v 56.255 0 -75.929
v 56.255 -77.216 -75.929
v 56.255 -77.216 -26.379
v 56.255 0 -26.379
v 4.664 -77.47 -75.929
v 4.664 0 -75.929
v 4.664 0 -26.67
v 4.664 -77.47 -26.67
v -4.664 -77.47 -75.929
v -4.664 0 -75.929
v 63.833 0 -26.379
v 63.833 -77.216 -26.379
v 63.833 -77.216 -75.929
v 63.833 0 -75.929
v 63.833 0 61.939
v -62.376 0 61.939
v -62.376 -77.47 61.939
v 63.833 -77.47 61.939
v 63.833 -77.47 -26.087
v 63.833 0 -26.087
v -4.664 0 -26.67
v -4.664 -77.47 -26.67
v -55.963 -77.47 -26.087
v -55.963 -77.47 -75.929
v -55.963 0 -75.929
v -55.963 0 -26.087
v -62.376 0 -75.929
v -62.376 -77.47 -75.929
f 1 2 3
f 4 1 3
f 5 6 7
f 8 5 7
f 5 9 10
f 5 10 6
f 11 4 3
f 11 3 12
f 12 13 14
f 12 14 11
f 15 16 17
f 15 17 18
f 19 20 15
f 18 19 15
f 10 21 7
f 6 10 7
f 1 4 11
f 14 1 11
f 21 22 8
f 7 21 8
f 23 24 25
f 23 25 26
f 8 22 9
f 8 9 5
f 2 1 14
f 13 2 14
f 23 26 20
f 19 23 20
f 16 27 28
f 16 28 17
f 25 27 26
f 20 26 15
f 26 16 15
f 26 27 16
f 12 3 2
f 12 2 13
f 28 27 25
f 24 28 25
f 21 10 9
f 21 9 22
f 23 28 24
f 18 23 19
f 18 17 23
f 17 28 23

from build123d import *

# Parameters (mm, degrees)
F0_W     = 126.2088567019
F0_H     = 88.0255773664
F1_DEPTH = 77.47
F2_W     = 6.4124614
F2_H     = 49.8422943056
F4_DEPTH = 77.47
F2_W_2   = 9.3272165395
F2_H_2   = 49.2593422532
F5_DEPTH = 77.47
F2_W_3   = 7.5783729553
F2_H_3   = 49.550820142
F6_DEPTH = 77.216


# Not quite as in the source:
# - the program builds the solid bodies; features that only make, move or delete a surface that nothing else refers to are left out


with BuildPart() as f1:
    # F0 (on Front) → F1 (new body)
    with BuildSketch(Plane.XZ):
        with Locations((0.7286891341, 17.9257392883)):
            Rectangle(F0_W, F0_H)
    extrude(amount=F1_DEPTH)

    # F2 (on Front) → F4 (join)
    with BuildSketch(Plane.XZ):
        with Locations((-59.1695085168, -51.0081965476)):
            Rectangle(F2_W, F2_H)
    extrude(amount=F4_DEPTH)


with BuildPart() as f5:
    # F2 (on Front) → F5 (new body)
    with BuildSketch(Plane.XZ):
        with Locations((2.328e-07, -51.2996725738)):
            Rectangle(F2_W_2, F2_H_2)
    extrude(amount=F5_DEPTH)


with BuildPart() as f6:
    # F2 (on Front) → F6 (new body)
    with BuildSketch(Plane.XZ):
        with Locations((60.043938458, -51.1539336294)):
            Rectangle(F2_W_3, F2_H_3)
    extrude(amount=F6_DEPTH)


solid = Compound([f1.part, f5.part, f6.part])
